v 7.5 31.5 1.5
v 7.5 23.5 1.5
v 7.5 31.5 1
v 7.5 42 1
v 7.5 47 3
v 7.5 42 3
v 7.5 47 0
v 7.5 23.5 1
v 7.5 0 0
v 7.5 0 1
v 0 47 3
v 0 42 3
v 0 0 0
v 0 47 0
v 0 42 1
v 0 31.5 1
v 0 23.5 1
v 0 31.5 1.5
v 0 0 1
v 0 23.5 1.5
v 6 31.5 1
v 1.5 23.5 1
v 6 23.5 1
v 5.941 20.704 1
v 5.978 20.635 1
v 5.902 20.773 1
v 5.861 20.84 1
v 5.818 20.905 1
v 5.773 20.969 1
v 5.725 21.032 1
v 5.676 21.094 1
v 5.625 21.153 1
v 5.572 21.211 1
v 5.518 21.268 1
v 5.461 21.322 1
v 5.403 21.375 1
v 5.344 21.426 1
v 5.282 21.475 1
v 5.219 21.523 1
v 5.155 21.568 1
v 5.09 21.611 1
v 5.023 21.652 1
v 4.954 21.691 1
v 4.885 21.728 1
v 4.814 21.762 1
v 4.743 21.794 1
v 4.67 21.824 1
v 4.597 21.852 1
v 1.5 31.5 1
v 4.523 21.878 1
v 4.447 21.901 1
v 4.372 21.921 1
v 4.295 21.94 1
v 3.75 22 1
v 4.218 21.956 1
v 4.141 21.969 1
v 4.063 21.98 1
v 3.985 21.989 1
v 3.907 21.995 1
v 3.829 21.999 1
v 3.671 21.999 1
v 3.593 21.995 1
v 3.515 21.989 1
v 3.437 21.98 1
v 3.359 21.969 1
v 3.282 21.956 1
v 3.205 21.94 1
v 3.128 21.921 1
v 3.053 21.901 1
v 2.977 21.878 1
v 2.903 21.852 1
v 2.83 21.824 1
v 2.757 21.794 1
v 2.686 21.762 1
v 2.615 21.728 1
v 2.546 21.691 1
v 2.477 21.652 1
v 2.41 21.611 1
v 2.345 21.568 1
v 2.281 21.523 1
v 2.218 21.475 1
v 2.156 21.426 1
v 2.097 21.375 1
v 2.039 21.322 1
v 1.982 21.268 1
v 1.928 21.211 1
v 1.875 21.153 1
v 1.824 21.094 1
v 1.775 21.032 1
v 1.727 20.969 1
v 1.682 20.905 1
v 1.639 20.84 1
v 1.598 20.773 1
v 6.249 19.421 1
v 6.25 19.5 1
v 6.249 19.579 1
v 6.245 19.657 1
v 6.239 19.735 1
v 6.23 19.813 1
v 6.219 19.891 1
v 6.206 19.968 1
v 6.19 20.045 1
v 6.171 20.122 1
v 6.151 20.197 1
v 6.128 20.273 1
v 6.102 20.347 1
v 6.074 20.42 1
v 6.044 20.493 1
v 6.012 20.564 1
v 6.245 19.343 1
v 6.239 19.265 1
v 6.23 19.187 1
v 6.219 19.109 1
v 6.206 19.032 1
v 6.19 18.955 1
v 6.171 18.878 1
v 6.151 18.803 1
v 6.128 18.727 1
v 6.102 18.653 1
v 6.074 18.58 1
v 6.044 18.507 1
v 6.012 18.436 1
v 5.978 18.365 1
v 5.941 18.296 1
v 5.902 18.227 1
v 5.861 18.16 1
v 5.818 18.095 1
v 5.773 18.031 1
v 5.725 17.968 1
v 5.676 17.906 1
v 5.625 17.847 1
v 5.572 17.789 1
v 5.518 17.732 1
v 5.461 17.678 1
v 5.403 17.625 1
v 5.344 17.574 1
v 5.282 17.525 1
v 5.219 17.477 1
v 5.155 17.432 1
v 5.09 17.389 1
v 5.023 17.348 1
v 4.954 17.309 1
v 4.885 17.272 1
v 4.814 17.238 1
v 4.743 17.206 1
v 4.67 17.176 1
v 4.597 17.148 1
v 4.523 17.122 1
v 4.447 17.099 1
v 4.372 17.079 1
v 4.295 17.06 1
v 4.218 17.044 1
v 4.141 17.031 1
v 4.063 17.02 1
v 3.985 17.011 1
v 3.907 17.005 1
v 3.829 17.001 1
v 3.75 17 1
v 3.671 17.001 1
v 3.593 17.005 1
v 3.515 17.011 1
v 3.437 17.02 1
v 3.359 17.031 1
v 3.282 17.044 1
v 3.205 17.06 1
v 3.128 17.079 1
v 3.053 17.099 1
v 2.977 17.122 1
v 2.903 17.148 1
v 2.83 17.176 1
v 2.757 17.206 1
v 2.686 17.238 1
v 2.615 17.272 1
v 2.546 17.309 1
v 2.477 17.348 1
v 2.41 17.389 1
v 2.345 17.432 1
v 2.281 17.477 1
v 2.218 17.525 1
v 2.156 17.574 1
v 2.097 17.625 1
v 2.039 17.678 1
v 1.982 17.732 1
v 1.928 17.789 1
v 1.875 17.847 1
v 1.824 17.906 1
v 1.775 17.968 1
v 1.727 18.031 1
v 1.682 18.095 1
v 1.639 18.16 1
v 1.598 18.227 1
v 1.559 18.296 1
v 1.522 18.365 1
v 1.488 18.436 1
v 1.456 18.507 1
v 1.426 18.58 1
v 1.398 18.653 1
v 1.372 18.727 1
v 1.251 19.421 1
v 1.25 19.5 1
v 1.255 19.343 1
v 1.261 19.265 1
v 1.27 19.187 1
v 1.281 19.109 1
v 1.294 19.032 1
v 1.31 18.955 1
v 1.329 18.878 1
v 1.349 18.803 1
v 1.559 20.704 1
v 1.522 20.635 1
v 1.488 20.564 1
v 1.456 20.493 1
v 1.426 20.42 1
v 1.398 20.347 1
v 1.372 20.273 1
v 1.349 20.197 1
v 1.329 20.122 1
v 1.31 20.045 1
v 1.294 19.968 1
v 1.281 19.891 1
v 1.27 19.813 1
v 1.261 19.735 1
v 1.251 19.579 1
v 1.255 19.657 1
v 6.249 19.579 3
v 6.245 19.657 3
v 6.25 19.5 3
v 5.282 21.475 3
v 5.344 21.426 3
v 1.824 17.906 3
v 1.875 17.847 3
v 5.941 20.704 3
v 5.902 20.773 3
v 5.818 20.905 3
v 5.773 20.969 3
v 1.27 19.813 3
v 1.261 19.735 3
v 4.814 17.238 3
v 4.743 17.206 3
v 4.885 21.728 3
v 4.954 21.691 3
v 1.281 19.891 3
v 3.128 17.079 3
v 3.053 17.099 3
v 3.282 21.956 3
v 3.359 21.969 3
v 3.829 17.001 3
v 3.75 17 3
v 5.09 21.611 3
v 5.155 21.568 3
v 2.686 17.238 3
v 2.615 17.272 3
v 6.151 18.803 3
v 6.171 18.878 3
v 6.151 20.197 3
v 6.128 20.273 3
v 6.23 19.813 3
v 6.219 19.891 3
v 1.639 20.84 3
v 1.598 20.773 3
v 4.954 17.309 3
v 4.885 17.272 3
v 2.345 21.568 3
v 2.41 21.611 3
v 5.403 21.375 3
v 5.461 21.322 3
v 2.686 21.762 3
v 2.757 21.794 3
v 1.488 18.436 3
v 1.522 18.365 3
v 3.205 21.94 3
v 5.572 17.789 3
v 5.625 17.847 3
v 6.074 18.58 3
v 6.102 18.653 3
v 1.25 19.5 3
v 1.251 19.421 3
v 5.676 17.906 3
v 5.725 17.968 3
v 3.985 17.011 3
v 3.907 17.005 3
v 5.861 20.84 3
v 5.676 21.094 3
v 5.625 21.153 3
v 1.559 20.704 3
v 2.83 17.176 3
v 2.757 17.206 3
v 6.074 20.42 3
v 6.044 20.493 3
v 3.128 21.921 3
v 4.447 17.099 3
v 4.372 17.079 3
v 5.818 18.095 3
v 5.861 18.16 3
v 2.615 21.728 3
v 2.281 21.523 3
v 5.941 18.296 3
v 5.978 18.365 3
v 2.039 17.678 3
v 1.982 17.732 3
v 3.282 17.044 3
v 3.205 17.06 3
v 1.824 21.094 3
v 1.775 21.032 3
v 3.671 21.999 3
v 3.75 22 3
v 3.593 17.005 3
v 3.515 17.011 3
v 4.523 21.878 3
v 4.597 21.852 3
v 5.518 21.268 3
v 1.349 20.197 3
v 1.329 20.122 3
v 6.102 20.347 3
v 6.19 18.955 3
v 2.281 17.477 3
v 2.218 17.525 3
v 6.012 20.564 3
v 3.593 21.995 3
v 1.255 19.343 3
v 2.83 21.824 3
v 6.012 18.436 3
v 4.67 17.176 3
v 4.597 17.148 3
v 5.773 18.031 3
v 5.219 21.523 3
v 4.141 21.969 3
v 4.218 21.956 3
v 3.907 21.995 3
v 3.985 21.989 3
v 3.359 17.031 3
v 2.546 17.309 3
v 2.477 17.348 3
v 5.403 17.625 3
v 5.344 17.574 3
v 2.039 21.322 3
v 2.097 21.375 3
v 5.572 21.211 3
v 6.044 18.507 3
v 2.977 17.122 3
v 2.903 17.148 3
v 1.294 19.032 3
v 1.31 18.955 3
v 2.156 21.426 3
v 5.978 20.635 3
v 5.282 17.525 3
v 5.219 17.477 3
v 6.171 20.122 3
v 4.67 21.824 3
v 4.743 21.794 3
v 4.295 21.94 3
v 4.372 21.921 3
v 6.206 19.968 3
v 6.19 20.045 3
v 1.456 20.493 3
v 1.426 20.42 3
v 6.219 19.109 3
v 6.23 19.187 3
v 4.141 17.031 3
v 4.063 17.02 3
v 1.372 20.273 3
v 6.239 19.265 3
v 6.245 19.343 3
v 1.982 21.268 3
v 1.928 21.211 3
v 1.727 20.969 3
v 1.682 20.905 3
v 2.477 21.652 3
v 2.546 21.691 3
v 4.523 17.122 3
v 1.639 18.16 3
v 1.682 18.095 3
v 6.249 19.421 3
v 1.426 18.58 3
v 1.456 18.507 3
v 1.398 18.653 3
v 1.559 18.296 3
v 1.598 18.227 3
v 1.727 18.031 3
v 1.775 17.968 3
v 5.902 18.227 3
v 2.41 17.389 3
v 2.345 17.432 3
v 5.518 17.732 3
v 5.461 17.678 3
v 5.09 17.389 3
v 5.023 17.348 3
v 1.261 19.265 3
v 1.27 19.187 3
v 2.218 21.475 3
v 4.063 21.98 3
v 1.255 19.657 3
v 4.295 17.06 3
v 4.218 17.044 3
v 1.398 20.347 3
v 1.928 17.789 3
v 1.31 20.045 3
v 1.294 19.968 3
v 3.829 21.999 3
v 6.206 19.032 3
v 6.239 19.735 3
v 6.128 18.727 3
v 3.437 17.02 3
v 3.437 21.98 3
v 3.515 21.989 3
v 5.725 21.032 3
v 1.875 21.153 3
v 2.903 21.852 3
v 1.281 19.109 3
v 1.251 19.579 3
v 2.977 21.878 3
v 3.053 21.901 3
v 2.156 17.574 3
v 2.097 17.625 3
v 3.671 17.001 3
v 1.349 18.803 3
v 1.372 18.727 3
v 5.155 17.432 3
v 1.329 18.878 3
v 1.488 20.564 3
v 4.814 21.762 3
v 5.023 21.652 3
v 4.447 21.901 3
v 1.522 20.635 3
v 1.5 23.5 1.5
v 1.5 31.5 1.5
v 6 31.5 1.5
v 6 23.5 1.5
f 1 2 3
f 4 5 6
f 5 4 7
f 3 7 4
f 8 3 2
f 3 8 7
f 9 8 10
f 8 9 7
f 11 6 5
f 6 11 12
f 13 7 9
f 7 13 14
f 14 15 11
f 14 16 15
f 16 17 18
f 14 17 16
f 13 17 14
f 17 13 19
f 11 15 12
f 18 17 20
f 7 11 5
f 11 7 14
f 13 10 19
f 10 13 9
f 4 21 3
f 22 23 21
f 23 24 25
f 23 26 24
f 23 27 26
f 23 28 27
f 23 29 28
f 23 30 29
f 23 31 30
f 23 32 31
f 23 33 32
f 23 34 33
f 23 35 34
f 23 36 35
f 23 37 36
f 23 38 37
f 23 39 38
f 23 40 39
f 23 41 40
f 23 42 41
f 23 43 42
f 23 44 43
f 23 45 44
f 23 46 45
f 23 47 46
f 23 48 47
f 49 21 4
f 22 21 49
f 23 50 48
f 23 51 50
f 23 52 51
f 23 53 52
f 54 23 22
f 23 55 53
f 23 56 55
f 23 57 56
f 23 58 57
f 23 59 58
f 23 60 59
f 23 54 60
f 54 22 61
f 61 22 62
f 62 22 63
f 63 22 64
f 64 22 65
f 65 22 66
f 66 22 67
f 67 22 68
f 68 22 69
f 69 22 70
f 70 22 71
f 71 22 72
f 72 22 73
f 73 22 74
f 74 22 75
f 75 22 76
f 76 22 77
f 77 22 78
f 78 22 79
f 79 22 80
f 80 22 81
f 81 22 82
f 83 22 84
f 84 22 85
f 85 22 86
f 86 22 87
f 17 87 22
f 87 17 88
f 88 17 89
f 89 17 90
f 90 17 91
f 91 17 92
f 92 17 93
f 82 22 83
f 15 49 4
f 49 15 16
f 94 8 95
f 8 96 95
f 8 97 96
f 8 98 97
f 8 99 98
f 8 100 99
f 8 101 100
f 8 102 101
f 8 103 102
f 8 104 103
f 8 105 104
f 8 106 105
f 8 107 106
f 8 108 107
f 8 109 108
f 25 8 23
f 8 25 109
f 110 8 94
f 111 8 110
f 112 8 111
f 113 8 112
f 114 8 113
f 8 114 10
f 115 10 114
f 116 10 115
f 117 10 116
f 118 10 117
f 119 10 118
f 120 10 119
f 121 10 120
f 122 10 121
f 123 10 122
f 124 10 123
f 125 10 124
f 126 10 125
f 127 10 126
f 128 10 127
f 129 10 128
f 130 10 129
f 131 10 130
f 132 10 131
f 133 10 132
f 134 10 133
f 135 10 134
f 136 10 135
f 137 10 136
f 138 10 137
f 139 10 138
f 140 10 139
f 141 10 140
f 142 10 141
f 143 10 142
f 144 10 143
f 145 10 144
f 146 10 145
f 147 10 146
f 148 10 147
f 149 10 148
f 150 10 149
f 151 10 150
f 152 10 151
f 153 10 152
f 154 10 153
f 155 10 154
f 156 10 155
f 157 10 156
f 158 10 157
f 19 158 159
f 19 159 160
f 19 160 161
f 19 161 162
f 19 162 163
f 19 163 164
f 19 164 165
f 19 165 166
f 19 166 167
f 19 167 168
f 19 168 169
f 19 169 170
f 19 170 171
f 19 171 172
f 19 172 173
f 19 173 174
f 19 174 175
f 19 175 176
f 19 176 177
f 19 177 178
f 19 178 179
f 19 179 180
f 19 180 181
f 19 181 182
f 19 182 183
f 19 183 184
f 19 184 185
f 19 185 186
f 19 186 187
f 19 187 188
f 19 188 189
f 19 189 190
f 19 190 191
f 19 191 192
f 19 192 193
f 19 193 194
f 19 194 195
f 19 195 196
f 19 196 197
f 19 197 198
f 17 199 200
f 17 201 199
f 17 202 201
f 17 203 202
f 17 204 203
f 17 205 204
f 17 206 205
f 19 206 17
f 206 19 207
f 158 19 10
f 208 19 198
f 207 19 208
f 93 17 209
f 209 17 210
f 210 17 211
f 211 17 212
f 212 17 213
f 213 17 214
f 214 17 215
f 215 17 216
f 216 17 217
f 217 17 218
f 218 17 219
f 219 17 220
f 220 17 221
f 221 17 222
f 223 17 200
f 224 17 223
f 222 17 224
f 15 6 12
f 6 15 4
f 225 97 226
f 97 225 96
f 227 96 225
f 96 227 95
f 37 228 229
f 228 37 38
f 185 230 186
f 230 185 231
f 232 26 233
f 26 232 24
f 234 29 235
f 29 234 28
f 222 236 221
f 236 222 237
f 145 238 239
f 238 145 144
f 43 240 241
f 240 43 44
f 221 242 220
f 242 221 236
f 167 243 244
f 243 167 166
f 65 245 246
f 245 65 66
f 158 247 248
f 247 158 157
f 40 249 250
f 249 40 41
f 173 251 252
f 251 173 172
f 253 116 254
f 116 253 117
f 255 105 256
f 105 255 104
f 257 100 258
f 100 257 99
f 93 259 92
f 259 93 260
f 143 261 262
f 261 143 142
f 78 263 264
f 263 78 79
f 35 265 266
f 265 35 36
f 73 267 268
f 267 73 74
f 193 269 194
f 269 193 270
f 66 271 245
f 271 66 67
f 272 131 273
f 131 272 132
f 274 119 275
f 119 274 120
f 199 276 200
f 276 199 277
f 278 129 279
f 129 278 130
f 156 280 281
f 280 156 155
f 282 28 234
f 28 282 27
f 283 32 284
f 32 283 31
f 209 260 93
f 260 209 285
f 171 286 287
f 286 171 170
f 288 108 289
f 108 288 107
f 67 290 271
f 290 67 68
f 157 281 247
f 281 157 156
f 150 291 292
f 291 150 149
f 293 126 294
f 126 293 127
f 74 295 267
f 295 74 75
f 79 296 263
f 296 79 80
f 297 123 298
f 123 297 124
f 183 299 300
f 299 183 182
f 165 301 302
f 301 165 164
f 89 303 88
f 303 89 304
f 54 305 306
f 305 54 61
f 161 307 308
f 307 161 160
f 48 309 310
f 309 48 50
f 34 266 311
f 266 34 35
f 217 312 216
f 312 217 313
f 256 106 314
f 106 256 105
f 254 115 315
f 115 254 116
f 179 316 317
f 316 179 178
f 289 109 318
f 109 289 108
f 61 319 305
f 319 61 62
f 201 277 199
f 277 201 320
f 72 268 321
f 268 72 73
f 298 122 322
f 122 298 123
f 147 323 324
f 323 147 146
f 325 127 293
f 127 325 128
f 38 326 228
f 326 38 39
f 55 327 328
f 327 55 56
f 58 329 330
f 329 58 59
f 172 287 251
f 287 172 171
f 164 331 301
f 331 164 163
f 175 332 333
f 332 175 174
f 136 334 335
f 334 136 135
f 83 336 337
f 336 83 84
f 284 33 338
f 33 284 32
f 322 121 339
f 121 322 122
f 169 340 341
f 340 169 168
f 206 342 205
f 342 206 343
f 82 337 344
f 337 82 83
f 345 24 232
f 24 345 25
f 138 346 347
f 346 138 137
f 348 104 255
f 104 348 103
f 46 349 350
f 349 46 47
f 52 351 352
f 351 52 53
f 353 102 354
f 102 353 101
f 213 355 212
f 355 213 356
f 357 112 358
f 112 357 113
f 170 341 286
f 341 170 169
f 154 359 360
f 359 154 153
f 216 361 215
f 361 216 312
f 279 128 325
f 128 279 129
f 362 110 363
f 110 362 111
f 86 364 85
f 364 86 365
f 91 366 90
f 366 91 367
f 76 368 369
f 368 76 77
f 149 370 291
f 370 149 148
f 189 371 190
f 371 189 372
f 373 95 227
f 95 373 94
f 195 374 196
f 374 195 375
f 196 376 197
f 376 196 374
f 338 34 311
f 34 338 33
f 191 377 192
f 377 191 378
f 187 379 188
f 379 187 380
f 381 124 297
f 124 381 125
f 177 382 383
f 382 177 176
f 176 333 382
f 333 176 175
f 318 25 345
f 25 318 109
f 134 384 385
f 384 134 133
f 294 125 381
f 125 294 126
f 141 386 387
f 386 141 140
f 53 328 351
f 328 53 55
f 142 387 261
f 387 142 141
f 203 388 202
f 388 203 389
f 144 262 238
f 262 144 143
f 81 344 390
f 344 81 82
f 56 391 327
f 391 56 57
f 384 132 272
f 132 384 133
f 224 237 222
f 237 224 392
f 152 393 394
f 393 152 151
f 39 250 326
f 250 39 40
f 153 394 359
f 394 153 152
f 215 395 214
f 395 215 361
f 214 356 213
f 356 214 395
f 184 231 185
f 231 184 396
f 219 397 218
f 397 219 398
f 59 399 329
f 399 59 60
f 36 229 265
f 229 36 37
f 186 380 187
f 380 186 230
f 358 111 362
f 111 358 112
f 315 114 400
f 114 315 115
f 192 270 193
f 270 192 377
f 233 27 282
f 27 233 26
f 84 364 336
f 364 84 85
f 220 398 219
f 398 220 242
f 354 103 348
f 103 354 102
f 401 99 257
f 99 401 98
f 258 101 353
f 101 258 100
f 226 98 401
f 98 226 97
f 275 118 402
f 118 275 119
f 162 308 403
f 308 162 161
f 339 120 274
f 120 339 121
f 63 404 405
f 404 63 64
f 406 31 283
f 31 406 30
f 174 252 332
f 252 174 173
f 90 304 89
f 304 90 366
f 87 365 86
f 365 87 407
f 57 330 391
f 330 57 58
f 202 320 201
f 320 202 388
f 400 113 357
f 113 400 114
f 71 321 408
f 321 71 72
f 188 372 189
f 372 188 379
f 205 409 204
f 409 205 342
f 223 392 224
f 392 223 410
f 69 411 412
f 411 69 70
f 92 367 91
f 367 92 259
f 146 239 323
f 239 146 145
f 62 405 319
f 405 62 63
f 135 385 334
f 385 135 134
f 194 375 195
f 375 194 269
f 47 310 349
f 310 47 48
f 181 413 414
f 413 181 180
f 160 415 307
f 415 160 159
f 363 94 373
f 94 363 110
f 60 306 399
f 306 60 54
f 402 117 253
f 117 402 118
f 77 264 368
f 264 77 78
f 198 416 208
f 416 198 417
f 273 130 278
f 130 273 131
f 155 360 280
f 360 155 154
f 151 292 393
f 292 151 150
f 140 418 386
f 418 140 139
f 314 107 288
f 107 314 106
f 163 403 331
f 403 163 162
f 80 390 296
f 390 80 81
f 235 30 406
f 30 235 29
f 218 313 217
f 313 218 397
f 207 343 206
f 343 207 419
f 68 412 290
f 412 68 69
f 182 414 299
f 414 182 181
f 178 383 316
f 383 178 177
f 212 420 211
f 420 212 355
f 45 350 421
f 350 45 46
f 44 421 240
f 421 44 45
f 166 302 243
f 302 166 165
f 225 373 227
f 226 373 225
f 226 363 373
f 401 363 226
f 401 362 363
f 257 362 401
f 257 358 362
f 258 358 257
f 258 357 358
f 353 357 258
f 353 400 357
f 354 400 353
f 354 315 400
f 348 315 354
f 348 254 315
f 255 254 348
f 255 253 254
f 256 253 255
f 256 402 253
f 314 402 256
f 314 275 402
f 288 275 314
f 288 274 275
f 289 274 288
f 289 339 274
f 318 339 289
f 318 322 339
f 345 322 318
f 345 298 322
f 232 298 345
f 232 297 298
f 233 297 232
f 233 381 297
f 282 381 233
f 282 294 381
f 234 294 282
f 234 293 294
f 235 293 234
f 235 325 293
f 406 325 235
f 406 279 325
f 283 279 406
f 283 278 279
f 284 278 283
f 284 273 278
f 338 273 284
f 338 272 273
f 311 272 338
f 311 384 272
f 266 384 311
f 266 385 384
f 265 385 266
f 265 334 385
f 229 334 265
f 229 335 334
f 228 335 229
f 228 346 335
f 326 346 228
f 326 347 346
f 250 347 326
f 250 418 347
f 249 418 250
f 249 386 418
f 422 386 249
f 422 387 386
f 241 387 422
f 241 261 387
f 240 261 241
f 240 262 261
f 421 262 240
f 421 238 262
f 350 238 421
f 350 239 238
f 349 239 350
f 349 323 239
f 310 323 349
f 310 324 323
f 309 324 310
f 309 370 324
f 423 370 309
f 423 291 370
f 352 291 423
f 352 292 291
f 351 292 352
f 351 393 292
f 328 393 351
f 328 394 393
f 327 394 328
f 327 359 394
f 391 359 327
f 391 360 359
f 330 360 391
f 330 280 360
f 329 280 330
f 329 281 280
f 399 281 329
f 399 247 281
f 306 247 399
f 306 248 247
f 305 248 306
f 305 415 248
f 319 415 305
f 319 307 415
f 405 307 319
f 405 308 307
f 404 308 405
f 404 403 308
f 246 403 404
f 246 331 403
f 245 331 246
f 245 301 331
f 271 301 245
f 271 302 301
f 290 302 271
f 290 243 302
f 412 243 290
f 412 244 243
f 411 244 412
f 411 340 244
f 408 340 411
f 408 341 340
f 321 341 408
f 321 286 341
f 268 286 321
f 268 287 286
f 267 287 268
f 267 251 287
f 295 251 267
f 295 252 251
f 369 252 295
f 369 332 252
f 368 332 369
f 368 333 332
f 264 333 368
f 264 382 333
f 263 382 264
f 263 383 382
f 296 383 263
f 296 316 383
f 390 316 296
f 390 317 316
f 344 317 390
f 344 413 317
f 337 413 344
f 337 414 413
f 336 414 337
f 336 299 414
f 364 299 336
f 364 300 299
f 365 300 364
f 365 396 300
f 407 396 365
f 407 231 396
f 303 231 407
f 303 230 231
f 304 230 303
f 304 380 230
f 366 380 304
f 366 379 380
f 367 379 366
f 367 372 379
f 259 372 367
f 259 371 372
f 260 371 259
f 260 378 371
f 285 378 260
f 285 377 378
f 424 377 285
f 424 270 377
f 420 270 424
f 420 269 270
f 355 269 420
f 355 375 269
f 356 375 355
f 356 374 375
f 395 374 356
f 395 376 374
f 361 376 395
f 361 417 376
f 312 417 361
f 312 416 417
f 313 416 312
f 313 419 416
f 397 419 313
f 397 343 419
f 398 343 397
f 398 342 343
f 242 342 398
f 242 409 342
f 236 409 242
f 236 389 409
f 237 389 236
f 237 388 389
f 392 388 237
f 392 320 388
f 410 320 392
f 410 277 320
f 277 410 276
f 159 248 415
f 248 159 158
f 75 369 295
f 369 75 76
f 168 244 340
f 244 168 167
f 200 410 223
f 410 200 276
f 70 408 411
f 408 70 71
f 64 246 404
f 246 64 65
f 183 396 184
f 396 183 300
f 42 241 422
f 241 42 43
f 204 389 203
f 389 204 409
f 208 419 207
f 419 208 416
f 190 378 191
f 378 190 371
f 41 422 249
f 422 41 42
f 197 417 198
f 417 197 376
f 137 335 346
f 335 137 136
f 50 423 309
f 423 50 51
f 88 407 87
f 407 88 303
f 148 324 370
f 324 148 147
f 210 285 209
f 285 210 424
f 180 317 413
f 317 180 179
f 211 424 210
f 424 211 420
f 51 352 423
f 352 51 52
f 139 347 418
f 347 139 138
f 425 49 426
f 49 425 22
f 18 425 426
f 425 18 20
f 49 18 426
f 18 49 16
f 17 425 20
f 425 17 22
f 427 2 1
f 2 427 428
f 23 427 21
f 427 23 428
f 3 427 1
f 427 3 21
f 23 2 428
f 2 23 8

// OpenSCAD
$fn=200;

difference()
{
    cube([7.5,47,3]);
    translate([0,0,1])
    {
        cube([7.5,42,3]);
    }
}
translate([3.75,19.5,0])
{
    cylinder(h=3,d=5);
}
translate([0,23.5,0])
{
    cube([1.5,8,1.5]);
}
translate([6,23.5,0])
{
    cube([1.5,8,1.5]);
}
